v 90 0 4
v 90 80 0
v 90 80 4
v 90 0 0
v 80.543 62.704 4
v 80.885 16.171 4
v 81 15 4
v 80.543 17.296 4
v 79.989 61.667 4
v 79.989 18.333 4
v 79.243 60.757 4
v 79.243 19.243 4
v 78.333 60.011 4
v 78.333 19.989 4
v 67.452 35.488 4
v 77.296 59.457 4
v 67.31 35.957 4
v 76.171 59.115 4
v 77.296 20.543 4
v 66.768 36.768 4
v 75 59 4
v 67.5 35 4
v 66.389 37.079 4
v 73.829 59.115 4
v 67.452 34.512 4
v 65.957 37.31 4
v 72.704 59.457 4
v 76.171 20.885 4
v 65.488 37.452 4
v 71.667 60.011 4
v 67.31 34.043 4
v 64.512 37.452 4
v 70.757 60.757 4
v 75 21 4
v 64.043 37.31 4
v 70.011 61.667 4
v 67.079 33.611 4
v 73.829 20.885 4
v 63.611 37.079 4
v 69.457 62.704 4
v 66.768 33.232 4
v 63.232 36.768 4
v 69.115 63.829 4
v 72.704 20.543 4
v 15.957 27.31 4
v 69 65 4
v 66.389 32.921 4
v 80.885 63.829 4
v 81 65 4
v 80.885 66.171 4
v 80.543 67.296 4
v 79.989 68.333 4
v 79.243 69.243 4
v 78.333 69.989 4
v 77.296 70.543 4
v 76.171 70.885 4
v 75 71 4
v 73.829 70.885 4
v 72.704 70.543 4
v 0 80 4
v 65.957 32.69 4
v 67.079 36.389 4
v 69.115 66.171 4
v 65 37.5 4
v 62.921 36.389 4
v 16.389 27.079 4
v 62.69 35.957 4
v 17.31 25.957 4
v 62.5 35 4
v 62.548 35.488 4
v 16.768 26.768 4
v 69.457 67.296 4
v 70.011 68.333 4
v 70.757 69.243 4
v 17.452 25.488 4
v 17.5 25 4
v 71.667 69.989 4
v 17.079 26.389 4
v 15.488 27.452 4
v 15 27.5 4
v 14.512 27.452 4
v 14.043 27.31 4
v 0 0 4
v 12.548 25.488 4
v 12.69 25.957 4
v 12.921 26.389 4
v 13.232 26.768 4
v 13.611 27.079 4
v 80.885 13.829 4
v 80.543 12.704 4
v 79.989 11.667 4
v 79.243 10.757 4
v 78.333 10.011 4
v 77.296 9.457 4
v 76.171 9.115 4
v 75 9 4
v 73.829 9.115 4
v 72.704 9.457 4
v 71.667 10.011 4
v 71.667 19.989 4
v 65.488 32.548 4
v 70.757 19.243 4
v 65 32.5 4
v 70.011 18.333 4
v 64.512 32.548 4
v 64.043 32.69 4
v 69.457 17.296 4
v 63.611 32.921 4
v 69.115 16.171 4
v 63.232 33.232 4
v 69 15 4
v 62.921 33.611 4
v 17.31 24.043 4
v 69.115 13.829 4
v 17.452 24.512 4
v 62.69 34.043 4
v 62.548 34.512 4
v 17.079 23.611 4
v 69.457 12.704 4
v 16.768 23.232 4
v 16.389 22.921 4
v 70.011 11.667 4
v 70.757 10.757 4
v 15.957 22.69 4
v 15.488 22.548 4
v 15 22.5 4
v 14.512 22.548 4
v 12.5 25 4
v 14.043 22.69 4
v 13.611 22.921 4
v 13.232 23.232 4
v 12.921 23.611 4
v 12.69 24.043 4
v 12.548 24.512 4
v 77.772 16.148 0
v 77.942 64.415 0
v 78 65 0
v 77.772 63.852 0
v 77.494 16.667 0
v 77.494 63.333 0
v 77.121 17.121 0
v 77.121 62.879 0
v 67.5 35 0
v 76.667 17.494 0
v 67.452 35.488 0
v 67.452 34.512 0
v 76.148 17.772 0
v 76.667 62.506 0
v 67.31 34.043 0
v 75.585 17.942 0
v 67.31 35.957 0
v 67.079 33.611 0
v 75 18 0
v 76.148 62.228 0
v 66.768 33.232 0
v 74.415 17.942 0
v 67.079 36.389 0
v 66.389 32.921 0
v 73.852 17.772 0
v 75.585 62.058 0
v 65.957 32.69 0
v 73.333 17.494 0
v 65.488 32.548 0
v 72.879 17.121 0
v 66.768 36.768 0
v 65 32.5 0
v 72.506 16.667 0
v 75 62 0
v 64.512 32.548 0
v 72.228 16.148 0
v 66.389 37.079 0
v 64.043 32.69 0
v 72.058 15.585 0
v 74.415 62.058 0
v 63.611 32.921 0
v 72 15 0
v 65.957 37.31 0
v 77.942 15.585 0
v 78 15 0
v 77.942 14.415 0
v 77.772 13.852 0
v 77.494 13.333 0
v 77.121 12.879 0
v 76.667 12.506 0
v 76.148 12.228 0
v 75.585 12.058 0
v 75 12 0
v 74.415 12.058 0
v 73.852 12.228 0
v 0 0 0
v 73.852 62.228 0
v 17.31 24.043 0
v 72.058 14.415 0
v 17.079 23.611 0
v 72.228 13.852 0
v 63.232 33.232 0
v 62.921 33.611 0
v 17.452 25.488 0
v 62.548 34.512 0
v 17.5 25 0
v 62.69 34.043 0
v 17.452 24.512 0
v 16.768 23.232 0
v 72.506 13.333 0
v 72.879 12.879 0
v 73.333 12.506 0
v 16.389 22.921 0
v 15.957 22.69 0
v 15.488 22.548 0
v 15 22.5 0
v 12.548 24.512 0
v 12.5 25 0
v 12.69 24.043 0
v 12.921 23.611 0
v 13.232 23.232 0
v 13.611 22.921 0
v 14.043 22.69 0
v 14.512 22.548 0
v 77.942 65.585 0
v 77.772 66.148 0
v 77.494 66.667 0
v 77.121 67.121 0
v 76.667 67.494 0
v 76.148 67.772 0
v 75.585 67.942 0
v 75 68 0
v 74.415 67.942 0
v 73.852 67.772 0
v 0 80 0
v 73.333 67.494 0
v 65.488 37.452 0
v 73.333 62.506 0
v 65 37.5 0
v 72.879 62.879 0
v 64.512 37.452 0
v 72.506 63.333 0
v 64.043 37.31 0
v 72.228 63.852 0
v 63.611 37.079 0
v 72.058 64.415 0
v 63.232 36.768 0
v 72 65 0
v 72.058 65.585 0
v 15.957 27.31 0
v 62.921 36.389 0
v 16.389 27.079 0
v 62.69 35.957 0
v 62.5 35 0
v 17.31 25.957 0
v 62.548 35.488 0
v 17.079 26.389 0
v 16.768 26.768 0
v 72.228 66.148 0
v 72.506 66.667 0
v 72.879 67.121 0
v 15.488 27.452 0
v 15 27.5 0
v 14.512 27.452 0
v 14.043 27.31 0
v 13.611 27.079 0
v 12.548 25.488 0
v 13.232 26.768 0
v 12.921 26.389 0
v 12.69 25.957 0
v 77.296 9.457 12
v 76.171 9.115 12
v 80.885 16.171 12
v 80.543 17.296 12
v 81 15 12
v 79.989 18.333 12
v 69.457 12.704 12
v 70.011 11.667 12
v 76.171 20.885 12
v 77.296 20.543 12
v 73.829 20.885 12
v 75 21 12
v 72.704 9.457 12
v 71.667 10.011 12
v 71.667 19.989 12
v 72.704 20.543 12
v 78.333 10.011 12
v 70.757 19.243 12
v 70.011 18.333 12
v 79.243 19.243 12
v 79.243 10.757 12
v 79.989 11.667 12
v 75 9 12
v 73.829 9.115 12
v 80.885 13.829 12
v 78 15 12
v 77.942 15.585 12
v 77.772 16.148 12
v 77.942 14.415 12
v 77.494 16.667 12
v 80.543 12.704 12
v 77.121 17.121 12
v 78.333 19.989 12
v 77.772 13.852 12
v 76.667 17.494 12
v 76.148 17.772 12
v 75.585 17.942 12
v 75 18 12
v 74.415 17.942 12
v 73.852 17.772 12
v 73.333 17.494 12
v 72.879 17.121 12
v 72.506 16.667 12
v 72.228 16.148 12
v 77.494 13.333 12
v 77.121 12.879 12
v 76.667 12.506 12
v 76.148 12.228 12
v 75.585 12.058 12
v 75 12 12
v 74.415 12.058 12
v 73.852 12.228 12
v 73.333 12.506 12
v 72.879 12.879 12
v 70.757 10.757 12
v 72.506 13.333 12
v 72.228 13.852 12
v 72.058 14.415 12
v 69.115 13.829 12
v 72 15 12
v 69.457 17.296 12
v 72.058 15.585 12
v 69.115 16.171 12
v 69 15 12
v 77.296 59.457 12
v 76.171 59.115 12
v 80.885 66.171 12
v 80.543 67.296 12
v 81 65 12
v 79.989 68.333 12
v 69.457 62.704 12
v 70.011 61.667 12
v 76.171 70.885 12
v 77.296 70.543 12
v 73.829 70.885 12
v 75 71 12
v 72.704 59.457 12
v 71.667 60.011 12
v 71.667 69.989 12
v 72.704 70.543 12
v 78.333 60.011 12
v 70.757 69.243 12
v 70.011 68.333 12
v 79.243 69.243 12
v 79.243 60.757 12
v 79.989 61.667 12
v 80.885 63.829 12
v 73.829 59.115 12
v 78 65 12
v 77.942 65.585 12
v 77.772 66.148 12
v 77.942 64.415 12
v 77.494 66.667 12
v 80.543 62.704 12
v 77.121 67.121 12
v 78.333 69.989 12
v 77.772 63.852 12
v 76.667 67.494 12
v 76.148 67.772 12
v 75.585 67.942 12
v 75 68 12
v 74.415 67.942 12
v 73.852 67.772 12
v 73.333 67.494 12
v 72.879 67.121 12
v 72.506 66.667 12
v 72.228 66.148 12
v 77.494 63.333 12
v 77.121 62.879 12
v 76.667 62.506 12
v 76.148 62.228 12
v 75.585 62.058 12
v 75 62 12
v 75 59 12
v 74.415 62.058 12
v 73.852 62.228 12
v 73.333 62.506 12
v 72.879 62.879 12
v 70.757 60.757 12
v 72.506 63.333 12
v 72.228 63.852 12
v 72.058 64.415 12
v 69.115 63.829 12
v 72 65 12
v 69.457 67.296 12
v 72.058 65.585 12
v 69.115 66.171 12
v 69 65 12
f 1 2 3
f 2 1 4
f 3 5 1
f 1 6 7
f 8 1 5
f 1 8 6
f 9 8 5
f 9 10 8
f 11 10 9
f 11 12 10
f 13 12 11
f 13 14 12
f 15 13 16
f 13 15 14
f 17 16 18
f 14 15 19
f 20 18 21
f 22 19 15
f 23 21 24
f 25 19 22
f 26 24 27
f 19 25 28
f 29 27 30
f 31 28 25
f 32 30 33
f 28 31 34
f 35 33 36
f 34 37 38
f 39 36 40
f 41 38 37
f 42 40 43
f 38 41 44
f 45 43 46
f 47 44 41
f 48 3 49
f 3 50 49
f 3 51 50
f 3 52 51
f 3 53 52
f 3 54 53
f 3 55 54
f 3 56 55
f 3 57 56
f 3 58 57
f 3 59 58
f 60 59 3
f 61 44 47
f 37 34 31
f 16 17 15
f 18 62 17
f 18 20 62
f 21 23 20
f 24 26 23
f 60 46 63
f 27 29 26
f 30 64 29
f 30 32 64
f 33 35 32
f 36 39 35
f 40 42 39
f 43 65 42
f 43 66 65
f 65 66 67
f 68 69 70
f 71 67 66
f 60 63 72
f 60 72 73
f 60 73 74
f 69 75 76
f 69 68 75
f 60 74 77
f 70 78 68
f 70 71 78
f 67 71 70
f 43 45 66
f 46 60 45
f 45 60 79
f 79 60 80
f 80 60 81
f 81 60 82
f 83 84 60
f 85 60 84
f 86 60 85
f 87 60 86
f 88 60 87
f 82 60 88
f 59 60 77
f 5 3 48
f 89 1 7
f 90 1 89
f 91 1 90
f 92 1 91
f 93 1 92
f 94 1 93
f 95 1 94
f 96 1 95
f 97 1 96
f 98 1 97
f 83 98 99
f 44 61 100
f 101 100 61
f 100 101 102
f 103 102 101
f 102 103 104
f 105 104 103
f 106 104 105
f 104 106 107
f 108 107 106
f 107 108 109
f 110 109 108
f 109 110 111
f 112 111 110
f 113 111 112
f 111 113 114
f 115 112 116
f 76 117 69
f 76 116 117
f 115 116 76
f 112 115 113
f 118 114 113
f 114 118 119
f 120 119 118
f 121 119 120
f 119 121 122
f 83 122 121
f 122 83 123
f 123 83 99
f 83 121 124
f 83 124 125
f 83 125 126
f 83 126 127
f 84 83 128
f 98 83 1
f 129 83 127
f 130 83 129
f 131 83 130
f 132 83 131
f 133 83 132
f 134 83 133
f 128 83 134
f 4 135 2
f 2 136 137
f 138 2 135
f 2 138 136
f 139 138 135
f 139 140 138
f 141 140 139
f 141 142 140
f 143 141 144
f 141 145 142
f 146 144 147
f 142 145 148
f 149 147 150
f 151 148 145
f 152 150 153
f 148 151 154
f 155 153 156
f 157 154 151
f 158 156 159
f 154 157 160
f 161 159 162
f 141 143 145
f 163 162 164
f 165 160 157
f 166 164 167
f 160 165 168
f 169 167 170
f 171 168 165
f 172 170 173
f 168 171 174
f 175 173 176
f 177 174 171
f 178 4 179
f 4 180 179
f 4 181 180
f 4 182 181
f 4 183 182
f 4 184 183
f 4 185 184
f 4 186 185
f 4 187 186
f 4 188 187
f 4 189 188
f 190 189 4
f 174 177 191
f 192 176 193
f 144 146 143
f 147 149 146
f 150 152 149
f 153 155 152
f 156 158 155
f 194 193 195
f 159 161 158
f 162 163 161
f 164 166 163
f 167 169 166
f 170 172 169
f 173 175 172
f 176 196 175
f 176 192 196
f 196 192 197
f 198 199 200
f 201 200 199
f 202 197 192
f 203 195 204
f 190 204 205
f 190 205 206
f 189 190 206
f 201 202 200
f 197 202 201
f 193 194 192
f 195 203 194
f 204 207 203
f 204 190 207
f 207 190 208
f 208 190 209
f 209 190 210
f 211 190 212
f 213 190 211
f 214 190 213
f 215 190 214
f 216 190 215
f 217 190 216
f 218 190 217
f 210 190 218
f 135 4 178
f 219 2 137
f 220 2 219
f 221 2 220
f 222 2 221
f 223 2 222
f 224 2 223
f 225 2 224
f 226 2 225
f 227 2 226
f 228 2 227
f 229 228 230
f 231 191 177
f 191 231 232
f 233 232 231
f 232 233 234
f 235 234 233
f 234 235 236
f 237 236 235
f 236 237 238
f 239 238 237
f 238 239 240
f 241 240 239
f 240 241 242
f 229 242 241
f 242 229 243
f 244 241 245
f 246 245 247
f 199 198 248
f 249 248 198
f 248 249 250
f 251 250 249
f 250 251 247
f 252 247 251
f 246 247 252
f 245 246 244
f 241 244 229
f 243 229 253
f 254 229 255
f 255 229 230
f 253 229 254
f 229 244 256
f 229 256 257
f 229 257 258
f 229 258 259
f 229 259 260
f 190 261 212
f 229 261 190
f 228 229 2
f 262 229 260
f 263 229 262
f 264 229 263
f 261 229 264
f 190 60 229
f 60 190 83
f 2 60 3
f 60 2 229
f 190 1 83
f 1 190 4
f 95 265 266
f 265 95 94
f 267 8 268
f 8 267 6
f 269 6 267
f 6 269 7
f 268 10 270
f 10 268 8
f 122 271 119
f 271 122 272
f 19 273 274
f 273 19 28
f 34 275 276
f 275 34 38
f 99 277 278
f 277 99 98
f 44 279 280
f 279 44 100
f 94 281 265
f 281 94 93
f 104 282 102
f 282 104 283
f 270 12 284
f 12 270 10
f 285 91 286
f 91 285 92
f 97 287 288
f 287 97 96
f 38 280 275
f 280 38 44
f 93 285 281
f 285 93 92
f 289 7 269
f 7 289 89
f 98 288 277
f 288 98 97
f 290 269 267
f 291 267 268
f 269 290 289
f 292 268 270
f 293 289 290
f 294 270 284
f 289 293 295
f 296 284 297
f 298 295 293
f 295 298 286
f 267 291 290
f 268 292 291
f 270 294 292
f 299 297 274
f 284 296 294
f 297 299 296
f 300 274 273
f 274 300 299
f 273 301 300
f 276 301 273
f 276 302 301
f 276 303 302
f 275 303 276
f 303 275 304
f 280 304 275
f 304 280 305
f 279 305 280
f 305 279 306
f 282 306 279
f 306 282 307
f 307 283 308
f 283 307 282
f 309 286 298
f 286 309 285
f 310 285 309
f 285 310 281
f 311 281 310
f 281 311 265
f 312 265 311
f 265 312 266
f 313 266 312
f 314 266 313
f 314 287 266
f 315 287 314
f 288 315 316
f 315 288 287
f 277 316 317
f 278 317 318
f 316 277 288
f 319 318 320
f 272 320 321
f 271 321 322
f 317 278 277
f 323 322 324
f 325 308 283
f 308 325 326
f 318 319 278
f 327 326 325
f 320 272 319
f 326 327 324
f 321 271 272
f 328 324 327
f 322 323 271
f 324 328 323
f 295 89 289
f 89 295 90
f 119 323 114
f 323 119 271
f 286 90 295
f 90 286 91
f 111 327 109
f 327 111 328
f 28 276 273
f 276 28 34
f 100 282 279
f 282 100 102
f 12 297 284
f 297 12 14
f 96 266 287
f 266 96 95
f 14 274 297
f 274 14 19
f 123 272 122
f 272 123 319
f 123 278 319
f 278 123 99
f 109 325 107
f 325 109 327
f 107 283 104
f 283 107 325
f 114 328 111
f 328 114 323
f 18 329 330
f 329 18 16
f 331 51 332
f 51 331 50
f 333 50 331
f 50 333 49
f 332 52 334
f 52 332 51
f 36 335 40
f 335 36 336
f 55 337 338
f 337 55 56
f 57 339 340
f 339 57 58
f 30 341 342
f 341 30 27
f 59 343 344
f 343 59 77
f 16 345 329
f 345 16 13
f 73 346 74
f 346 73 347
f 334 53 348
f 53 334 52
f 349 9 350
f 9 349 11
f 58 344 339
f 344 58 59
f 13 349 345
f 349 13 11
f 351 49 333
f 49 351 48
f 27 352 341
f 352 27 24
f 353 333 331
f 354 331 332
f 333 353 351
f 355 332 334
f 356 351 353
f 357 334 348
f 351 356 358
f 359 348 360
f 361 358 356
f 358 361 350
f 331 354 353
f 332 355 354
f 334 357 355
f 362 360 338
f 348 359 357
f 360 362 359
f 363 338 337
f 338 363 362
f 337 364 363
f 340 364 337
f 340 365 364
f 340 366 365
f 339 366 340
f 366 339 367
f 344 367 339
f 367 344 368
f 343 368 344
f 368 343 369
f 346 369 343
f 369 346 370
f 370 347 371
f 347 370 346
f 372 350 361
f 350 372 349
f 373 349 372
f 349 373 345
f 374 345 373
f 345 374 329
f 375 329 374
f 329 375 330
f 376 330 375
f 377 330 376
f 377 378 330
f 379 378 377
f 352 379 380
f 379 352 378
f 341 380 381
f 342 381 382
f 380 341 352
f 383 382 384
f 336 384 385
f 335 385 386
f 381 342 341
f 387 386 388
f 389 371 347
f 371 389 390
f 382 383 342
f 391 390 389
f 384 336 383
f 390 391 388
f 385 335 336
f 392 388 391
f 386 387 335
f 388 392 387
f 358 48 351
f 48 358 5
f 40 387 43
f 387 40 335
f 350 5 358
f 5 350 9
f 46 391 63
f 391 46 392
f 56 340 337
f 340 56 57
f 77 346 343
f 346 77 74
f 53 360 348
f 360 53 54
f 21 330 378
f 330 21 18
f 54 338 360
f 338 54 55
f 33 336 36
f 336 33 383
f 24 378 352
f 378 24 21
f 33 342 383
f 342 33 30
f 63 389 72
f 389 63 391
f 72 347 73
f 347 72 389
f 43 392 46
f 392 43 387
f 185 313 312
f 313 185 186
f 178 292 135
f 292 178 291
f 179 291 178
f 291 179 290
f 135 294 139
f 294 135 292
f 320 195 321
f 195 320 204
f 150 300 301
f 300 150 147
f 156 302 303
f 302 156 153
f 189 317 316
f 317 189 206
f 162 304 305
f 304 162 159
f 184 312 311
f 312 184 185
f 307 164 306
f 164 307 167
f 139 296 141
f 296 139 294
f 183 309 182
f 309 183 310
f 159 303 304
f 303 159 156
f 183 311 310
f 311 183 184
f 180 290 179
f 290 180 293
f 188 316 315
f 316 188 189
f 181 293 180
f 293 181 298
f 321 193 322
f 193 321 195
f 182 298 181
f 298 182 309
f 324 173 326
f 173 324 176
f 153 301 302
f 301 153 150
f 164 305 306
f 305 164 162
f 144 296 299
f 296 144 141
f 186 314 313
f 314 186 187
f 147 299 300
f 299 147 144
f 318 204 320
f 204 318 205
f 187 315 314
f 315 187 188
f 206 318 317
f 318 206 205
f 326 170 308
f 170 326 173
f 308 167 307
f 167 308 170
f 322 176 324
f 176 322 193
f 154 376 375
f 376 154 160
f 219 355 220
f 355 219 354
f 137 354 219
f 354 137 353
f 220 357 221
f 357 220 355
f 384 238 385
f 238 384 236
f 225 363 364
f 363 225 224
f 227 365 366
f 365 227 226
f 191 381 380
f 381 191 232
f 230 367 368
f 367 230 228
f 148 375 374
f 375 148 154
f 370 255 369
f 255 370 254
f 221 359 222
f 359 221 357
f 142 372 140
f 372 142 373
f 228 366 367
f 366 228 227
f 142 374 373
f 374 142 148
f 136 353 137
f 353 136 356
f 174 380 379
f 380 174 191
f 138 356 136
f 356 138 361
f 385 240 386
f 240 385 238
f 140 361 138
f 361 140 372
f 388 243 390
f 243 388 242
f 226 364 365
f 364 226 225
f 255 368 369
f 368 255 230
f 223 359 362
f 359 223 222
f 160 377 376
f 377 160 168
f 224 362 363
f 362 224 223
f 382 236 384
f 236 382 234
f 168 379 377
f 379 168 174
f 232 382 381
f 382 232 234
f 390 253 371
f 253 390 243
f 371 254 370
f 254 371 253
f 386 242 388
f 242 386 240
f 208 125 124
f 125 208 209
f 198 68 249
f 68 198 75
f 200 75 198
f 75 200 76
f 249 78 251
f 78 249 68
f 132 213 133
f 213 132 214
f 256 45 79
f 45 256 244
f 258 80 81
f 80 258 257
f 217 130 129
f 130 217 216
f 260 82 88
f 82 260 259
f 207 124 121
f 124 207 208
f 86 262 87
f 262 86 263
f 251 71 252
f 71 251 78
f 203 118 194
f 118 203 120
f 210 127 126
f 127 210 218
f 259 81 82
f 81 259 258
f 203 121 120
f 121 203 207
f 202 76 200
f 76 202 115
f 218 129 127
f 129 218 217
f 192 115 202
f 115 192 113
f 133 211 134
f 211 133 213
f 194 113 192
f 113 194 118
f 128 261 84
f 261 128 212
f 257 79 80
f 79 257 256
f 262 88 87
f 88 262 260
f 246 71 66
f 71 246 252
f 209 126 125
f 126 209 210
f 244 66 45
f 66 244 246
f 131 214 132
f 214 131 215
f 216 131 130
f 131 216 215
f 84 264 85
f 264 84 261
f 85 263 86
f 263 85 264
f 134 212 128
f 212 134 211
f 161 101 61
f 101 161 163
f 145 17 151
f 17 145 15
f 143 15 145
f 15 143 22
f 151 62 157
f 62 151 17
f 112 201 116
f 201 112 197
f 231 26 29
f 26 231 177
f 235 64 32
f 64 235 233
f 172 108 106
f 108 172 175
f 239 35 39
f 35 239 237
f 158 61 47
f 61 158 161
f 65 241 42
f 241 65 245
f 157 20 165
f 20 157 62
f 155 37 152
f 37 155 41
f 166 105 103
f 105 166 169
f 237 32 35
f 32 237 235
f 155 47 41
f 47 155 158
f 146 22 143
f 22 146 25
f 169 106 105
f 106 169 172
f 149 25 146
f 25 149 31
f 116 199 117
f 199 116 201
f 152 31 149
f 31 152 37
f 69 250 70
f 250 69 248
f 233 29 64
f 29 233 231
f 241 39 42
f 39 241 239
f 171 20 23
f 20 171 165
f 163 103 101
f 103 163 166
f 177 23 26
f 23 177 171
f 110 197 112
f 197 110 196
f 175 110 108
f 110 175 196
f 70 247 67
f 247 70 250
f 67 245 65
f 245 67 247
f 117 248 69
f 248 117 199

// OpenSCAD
$fn = 32;

// ----------------------------------------------------------------------
// Mixed field: bosses and holes at given coordinates
// ----------------------------------------------------------------------

// --- parameters (mm) ---
plate_l = 90;             // plate length, X
plate_w = 80;             // plate width, Y
plate_t = 4;              // plate thickness, Z
boss_d = 12;              // boss diameter
boss_h = 8;               // boss height above the plate
hole_d = 5;               // through hole diameter

total_h = plate_t + boss_h;  // overall height

difference() {
  union() {
    cube([plate_l, plate_w, plate_t]);
    translate([75, 15, plate_t]) cylinder(h = boss_h, d = boss_d);
    translate([75, 65, plate_t]) cylinder(h = boss_h, d = boss_d);
  }
  translate([75, 15, -1]) cylinder(h = total_h + 2, d = boss_d / 2);
  translate([75, 65, -1]) cylinder(h = total_h + 2, d = boss_d / 2);
  translate([15, 25, -1]) cylinder(h = plate_t + 2, d = hole_d);
  translate([65, 35, -1]) cylinder(h = plate_t + 2, d = hole_d);
}
